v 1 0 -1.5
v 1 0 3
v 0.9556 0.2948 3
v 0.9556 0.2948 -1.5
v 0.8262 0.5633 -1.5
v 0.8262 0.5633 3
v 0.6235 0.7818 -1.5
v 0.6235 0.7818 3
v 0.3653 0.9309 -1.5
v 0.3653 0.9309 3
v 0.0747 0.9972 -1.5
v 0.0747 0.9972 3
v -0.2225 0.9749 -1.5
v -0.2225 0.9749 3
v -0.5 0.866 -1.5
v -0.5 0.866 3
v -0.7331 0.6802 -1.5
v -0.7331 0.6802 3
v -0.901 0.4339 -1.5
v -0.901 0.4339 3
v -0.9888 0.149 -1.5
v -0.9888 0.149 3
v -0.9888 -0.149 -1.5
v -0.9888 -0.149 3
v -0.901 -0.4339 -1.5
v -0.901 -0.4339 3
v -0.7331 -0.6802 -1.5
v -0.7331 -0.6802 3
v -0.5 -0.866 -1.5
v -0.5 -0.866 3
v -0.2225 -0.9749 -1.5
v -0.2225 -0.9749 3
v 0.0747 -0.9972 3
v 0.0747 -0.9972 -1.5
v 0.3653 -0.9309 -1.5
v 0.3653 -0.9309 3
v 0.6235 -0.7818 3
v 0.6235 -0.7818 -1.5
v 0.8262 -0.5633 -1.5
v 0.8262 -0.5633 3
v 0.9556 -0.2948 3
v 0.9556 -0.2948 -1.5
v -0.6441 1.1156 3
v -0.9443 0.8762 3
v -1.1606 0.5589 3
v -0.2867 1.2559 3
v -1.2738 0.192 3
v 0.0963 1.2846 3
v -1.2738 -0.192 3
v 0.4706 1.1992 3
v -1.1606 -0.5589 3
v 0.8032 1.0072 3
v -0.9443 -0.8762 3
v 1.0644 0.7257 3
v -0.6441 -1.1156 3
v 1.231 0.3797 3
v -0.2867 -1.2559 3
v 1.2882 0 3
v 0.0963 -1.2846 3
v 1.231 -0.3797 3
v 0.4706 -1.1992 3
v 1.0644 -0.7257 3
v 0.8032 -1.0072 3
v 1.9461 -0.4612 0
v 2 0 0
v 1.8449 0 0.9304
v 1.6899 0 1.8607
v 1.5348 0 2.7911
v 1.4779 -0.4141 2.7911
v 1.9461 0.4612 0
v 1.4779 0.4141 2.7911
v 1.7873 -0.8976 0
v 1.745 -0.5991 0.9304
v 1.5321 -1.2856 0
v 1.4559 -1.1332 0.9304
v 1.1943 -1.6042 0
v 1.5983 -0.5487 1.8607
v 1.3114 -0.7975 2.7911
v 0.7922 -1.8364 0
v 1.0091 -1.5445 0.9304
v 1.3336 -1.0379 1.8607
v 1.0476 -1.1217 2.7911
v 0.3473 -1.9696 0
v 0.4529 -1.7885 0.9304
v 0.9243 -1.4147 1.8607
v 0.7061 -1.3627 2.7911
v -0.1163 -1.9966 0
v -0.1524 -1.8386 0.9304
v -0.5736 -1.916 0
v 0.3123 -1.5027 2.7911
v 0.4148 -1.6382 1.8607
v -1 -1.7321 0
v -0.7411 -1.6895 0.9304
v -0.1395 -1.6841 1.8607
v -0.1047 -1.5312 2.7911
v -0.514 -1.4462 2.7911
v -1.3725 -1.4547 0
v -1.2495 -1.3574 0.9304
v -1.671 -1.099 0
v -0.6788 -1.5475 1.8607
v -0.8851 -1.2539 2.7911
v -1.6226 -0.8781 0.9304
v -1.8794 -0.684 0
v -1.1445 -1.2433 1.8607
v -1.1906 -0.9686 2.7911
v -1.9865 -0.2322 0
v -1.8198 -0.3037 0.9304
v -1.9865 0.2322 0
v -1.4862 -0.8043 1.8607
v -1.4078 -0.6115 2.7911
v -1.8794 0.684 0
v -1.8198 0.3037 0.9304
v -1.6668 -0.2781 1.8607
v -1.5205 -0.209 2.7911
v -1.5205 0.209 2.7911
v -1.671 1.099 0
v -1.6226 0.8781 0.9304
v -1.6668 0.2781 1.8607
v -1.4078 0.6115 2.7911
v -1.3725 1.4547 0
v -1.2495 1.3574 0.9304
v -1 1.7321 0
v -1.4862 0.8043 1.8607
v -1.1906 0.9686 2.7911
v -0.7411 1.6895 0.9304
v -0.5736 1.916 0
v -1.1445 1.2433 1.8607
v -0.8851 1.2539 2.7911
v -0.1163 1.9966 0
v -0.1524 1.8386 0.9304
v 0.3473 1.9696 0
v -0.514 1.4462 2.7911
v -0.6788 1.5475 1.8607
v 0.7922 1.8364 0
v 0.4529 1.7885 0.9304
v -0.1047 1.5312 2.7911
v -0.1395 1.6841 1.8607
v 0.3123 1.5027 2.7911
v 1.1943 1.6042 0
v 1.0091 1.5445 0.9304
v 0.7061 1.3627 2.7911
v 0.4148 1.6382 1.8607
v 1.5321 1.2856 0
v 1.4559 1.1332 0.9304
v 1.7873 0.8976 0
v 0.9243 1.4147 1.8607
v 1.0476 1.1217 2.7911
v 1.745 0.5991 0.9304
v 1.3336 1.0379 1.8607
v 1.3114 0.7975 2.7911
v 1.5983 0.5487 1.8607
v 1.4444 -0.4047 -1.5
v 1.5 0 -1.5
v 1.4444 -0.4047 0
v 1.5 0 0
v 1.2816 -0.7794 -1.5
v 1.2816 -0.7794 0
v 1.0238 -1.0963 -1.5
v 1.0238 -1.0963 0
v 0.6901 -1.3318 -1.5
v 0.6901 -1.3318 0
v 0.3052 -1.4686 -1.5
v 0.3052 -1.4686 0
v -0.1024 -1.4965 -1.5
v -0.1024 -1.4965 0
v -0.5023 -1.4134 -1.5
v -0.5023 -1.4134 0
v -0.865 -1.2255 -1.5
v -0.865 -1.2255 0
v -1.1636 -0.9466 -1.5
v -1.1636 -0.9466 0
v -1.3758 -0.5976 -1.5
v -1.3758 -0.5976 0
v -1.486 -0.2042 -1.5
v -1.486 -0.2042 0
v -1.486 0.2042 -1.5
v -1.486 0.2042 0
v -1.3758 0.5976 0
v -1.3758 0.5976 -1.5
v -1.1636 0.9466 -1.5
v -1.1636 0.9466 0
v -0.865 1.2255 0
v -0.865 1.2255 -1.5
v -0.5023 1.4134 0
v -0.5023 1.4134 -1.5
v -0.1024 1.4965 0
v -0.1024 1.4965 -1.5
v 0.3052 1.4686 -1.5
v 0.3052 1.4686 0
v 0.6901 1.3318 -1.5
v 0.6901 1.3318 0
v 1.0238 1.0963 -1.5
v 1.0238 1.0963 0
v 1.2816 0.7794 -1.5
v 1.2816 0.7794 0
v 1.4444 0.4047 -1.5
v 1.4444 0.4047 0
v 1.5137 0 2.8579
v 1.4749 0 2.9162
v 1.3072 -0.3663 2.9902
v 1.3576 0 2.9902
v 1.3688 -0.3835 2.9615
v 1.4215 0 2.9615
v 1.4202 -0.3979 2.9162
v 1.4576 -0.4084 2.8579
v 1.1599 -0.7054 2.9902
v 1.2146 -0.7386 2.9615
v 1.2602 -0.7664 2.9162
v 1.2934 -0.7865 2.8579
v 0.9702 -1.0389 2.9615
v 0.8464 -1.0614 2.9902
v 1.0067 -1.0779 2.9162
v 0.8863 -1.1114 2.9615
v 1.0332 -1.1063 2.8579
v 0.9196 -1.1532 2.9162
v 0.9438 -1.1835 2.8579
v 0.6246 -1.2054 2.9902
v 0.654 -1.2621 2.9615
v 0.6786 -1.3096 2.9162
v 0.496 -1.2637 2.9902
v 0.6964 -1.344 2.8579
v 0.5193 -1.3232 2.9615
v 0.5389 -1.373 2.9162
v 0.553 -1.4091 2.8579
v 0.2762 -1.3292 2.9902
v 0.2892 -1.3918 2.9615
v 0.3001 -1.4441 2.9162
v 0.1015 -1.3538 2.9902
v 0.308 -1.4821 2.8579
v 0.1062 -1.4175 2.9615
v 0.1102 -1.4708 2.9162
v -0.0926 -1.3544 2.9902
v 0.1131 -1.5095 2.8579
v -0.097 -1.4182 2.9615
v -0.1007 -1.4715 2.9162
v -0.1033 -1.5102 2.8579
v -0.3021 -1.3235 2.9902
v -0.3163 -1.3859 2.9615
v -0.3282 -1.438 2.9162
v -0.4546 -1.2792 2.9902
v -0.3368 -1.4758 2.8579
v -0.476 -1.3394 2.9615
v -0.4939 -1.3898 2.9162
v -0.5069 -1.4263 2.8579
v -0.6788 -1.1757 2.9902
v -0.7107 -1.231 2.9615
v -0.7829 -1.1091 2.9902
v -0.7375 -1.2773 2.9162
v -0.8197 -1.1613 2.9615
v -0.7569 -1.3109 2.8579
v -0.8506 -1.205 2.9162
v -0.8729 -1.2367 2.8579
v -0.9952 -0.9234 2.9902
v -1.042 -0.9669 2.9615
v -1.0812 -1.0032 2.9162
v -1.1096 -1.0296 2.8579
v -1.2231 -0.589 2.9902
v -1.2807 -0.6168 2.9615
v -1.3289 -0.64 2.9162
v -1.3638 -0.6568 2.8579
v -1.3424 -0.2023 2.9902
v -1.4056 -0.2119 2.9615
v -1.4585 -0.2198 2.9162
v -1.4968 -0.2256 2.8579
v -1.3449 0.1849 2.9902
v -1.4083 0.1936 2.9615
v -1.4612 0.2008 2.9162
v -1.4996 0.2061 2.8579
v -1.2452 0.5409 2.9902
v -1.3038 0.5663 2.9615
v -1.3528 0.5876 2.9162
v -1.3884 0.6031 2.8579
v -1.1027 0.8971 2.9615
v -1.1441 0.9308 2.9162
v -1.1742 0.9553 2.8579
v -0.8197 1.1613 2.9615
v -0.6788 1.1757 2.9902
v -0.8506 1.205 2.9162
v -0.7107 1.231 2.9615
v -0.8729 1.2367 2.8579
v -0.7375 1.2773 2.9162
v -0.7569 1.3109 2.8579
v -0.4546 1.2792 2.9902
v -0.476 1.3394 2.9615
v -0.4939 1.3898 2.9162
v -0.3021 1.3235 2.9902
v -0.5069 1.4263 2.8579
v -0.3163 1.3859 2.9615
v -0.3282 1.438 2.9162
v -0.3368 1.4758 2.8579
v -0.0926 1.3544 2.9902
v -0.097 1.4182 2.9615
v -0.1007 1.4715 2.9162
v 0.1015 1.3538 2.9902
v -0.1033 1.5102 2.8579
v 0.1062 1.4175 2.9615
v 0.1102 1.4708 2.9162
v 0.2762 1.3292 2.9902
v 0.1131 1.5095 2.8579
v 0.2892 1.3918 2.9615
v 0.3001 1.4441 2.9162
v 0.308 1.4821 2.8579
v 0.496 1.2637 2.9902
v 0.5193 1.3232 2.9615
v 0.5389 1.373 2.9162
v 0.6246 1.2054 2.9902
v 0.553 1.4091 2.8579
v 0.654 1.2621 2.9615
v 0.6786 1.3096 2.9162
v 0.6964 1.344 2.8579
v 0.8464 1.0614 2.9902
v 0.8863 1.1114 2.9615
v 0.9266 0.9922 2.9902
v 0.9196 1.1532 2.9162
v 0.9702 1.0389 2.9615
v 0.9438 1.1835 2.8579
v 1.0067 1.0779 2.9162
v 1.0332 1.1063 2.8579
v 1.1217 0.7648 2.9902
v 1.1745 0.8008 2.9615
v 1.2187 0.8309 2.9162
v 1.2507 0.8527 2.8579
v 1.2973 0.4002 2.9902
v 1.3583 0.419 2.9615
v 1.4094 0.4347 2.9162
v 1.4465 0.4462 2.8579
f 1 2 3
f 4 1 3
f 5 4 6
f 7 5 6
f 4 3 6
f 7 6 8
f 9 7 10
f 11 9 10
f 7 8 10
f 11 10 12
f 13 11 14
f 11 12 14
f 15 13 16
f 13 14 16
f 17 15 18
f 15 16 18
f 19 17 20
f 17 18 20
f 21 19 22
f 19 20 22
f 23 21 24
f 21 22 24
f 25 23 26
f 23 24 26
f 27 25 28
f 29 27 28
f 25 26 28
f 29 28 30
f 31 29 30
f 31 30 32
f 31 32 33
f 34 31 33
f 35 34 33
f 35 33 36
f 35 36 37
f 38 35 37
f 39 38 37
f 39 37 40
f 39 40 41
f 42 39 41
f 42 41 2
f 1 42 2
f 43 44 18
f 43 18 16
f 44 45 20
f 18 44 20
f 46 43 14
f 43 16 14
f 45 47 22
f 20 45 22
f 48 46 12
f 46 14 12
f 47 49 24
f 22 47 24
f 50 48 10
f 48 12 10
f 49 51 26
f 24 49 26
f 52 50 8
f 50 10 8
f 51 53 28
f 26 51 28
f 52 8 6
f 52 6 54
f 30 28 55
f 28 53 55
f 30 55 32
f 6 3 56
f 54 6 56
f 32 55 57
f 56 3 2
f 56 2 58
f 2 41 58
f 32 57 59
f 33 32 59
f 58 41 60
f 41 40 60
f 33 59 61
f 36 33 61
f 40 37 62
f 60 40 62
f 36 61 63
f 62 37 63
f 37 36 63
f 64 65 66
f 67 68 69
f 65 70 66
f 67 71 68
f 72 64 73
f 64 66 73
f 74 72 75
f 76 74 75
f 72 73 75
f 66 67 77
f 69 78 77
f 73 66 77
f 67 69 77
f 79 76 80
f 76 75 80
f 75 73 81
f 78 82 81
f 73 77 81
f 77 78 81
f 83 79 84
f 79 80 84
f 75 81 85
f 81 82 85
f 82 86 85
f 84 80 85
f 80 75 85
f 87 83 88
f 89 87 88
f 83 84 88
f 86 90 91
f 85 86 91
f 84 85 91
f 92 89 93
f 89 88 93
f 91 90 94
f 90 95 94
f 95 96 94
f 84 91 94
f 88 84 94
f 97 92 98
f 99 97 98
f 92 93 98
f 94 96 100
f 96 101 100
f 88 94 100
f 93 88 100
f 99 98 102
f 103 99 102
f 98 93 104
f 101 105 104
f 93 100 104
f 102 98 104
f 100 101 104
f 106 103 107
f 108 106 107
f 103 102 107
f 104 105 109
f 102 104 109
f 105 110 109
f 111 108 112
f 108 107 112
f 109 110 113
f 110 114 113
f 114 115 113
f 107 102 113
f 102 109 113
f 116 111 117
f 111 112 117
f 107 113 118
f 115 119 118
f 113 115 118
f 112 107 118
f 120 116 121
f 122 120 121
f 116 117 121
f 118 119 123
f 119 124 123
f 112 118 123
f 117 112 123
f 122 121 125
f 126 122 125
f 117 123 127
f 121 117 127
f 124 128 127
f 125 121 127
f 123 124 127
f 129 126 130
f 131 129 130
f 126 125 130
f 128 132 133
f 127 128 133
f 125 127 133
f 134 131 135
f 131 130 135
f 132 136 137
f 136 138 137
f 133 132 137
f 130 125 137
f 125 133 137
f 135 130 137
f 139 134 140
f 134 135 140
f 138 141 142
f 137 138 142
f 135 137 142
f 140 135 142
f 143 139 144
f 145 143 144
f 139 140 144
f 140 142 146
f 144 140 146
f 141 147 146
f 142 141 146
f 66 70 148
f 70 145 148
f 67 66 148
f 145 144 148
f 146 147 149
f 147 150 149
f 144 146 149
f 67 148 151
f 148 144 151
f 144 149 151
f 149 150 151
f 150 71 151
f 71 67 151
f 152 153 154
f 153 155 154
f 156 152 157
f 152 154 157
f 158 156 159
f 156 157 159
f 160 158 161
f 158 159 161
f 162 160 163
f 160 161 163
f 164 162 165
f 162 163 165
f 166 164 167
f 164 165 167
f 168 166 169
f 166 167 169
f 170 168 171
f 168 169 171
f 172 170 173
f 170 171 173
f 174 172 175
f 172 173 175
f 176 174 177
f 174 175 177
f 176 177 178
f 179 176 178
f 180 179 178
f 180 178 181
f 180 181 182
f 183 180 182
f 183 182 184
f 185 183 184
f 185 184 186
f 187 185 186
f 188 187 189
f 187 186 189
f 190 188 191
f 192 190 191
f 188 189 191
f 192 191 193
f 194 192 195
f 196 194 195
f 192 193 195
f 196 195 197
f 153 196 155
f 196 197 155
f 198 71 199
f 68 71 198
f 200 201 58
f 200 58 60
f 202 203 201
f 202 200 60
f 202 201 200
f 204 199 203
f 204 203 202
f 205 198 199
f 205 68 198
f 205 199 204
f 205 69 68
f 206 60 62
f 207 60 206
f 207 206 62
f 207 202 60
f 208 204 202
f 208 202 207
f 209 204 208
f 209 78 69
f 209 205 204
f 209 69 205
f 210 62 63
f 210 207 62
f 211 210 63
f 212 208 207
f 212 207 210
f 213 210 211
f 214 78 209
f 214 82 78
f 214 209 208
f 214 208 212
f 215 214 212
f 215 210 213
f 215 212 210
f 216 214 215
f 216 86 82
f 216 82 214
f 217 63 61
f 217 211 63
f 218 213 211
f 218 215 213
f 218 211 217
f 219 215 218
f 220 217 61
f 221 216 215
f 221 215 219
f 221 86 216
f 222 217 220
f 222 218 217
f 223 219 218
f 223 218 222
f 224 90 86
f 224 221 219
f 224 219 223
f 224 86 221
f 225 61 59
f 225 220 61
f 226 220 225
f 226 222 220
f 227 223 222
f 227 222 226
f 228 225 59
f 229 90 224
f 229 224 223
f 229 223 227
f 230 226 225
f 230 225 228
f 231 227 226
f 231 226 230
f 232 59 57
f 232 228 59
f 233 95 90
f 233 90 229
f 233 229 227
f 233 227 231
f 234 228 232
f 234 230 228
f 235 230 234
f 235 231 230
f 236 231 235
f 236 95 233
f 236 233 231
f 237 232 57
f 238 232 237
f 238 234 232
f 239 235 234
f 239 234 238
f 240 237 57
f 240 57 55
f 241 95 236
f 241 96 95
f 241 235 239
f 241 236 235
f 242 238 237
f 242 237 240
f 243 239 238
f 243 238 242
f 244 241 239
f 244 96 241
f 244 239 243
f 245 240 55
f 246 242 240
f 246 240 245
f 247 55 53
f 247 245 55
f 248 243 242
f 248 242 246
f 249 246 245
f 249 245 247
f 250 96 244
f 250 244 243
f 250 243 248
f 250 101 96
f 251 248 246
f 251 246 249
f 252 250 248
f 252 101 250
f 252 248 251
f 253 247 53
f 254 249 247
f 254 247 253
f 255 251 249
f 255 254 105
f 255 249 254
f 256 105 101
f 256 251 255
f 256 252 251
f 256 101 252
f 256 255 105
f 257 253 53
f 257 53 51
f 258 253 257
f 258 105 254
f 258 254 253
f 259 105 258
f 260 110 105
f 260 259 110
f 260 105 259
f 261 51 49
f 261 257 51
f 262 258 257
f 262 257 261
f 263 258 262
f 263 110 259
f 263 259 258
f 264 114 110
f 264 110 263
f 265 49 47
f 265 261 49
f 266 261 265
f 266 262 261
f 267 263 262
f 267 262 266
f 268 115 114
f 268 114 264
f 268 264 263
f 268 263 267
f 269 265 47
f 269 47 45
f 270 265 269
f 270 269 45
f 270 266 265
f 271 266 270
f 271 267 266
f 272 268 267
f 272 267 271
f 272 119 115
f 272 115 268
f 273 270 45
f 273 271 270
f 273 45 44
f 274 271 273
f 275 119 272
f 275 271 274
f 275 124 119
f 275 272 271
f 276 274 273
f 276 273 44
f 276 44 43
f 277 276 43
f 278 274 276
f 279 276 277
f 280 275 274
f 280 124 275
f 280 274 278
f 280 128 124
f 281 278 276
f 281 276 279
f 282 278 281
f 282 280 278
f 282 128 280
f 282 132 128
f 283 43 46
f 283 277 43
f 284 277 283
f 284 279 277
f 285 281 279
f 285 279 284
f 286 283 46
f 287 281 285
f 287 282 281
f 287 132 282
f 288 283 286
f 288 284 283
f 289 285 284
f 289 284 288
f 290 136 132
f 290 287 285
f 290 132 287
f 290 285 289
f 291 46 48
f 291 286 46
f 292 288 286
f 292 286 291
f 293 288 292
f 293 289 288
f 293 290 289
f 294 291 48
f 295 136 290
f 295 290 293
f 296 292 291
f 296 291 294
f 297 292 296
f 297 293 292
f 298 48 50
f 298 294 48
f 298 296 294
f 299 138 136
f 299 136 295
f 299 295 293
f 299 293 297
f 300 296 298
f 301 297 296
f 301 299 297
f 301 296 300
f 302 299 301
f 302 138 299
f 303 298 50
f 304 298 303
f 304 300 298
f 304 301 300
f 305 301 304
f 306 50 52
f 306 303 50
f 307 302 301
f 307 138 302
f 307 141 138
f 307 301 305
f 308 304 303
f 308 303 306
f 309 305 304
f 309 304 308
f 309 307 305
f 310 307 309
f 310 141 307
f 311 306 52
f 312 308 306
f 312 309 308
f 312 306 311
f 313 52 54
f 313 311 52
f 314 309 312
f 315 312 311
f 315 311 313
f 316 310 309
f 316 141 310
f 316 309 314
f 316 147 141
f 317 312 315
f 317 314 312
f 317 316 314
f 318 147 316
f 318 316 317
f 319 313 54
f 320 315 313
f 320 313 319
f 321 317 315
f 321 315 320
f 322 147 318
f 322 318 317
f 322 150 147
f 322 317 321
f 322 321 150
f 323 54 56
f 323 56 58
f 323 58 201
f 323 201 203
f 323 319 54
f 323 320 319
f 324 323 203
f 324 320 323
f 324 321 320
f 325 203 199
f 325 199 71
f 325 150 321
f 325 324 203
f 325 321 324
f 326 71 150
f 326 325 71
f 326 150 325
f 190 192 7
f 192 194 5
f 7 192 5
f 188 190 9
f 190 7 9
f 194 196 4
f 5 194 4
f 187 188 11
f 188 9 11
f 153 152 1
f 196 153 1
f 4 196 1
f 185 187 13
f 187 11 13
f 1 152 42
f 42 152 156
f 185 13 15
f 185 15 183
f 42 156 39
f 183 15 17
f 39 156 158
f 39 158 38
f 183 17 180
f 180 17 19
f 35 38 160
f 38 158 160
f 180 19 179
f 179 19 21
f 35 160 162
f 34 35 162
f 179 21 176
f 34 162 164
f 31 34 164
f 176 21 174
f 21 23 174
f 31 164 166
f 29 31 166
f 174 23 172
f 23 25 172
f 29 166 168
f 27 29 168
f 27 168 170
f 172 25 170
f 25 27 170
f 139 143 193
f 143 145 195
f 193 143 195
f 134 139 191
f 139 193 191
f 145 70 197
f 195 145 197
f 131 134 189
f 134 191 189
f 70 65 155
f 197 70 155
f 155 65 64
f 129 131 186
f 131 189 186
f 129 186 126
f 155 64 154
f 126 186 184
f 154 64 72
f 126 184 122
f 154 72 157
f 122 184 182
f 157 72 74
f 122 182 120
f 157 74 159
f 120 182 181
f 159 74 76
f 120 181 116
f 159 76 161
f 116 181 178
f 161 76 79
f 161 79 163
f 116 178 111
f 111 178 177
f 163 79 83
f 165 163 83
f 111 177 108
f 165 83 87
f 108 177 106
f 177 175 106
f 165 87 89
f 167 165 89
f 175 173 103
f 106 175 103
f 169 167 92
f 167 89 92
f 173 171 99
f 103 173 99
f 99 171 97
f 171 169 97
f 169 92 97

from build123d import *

# Parameters (mm, degrees)
F0_W     = 1.5
F0_H     = 1.5
F2_R     = 1
F3_DEPTH = 25
F4_R     = 0.25


with BuildPart() as f1:
    # F0 (on Front) → F1 (revolve)
    with BuildSketch(Plane.XZ):
        Polygon((0, 3), (0, 0), (1.5, 0), (2, 0), (1.5, 3), align=None)
        with Locations((0.75, -0.75)):
            Rectangle(F0_W, F0_H)
    revolve(axis=Axis((0, 0, 1.5), (0, 0, -1)))

    # F2 (on face) → F3 (cut)
    with BuildSketch(Plane.XY.offset(3)):
        Circle(F2_R)
    extrude(amount=-F3_DEPTH, mode=Mode.SUBTRACT)

    # F4
    f4_edges = [f1.edges().sort_by_distance(p)[0] for p in [
        (-1.5, 0, 3),
    ]]
    fillet(f4_edges, radius=F4_R)


solid = f1.part
